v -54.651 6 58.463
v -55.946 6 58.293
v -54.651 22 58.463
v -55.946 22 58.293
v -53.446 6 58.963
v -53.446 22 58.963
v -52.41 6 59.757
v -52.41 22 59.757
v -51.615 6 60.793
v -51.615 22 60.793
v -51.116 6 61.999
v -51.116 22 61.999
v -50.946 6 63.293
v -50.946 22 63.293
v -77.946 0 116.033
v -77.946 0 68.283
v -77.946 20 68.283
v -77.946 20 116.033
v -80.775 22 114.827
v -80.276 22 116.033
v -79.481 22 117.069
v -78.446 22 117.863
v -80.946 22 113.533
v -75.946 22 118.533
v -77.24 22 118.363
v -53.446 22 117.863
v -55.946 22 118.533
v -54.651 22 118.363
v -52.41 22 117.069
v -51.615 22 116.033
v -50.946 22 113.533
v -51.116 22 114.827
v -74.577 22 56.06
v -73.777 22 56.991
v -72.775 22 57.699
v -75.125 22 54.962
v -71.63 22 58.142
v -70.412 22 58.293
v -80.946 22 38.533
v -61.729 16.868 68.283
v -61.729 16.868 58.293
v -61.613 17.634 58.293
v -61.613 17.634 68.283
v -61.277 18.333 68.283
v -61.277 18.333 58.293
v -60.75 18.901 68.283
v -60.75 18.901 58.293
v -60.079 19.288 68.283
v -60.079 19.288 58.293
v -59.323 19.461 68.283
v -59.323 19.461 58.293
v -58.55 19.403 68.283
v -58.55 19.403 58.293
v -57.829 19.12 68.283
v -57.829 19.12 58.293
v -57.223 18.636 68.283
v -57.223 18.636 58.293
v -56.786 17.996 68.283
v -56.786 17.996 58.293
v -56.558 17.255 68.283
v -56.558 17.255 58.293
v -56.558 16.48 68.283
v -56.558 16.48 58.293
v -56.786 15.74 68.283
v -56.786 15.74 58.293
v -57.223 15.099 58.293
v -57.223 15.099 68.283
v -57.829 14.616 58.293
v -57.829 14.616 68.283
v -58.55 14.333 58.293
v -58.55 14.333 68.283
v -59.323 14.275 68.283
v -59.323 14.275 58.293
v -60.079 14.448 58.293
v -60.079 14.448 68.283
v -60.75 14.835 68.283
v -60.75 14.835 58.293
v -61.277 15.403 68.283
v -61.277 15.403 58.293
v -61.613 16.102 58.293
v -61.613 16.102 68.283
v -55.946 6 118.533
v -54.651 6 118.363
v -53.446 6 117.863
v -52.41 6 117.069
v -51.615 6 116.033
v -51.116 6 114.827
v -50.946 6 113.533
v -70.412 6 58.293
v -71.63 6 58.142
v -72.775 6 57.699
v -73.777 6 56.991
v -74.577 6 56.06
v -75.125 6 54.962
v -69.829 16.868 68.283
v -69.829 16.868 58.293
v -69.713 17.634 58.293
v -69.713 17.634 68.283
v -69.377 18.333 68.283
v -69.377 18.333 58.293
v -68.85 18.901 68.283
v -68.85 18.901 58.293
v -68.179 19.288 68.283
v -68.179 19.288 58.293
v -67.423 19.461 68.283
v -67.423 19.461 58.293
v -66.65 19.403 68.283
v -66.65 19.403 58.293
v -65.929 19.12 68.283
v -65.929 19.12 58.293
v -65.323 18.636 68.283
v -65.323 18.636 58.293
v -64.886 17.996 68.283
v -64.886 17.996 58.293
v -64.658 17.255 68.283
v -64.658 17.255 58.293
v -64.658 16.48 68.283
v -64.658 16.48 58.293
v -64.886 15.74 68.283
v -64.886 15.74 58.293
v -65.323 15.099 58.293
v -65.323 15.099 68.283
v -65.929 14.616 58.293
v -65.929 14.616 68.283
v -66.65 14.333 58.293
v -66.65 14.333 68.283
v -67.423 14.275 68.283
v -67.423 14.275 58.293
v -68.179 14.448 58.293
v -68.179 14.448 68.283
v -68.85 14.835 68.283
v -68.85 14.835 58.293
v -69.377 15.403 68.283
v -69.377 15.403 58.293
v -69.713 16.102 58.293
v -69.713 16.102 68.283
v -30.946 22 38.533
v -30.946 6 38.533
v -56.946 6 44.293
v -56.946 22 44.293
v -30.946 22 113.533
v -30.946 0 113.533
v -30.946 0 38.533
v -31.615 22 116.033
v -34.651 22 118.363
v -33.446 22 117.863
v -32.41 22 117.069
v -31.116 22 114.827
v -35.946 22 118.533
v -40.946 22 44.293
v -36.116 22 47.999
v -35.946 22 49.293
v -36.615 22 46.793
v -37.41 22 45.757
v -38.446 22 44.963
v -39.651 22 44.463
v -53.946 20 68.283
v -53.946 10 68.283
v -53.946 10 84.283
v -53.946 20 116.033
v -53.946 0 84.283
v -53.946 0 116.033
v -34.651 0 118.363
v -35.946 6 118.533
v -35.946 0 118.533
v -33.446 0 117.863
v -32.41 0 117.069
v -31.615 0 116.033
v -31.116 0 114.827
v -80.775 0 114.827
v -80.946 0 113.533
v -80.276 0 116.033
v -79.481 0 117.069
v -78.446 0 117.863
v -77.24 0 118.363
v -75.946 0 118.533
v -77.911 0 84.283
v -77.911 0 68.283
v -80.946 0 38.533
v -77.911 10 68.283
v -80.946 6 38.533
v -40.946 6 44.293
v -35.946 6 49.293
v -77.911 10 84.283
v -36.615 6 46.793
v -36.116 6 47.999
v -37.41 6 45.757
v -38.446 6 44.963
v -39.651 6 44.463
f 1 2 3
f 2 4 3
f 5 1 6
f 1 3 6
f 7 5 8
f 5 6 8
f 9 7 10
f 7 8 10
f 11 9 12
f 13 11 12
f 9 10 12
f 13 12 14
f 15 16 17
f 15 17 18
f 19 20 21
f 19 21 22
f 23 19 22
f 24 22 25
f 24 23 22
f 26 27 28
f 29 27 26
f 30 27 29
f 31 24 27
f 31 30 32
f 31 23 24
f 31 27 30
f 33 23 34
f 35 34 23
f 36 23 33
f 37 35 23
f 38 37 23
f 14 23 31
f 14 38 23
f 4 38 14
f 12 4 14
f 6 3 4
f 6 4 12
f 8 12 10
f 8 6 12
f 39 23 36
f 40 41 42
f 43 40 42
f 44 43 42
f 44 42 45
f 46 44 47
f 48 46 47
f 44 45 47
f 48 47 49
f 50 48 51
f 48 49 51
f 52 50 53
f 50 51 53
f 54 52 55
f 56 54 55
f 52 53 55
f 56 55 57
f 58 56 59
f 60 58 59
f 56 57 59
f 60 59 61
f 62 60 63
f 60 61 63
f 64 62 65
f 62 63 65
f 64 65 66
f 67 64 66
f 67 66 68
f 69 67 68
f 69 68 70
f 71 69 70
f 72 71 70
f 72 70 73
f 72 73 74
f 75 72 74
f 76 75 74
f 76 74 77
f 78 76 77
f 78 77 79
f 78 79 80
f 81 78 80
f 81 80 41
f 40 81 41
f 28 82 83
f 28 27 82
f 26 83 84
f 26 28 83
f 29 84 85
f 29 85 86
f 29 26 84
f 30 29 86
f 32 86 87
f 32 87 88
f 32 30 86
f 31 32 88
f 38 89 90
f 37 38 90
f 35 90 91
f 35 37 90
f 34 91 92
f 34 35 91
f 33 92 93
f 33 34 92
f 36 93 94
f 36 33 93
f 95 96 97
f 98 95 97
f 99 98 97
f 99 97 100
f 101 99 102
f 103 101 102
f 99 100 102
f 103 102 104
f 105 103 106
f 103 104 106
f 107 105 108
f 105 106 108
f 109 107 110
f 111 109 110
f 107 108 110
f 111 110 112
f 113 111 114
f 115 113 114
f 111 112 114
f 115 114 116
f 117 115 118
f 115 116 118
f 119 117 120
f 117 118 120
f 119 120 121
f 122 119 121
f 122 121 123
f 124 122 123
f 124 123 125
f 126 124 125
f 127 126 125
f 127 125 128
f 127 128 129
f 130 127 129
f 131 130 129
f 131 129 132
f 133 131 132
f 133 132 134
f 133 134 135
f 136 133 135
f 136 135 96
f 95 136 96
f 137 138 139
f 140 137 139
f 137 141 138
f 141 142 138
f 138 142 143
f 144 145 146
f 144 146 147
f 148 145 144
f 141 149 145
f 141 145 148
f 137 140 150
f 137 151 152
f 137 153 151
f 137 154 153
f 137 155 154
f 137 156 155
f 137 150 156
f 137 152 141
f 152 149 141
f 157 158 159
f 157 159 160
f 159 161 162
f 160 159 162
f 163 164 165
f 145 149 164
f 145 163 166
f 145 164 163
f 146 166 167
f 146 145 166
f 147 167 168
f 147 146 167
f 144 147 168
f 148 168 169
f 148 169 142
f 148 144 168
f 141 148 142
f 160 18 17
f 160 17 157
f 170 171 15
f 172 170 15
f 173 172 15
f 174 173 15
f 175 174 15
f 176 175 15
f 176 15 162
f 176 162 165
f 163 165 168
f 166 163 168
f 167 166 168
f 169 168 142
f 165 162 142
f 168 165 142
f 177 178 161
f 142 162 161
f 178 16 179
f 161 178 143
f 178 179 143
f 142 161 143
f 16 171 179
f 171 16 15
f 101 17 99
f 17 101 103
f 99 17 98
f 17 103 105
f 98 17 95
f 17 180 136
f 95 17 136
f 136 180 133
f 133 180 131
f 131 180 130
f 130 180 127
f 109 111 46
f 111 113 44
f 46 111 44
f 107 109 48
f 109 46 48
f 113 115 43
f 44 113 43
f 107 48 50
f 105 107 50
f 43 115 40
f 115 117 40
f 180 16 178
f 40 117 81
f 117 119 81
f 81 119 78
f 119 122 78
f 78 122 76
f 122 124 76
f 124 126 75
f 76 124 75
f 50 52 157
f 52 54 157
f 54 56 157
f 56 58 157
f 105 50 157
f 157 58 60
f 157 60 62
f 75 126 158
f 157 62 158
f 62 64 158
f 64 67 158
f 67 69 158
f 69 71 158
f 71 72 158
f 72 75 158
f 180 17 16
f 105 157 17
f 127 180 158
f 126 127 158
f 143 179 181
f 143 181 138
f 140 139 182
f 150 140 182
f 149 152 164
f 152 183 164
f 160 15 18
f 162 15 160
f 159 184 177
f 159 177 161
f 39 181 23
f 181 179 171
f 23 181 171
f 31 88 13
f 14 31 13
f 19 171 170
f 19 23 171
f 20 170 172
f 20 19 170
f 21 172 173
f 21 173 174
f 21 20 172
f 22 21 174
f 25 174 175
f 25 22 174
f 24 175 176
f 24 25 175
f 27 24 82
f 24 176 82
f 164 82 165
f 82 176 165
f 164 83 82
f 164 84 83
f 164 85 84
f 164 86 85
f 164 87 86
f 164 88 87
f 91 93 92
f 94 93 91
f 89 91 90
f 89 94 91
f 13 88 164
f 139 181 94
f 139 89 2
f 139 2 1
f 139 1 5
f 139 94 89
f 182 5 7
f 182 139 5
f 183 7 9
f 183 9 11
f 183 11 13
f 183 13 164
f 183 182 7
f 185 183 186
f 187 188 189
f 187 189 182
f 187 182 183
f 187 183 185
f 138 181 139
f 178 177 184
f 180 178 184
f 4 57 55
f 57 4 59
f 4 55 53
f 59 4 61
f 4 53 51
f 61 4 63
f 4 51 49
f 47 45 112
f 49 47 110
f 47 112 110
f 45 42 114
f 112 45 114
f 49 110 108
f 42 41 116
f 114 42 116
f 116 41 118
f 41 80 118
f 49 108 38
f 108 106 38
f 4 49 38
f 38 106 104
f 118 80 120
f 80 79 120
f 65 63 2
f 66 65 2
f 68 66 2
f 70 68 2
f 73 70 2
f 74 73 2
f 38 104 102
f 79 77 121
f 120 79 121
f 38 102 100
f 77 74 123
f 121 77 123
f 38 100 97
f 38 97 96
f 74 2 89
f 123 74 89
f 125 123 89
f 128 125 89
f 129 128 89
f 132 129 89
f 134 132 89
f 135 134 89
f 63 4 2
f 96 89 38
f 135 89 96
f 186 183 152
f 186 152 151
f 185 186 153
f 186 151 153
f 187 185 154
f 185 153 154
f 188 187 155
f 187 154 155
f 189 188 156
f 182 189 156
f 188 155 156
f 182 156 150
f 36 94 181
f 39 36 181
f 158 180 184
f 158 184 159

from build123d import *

# Parameters (mm, degrees)
SKETCH1_W           = 50
SKETCH1_H           = 80
BOSS_EXTRUDE1_DEPTH = 6
BOSS_EXTRUDE2_DEPTH = 16
FILLET1_R           = 5
FILLET2_R           = 5
SKETCH3_R           = 2.6
CUT_EXTRUDE1_DEPTH  = 10
SKETCH4_W           = 24
SKETCH4_H           = 47.75
CUT_EXTRUDE3_DEPTH  = 20
SKETCH5_W           = 23.965270804
SKETCH5_H           = 10
BOSS_EXTRUDE3_DEPTH = 16
FILLET3_R           = 5


with BuildPart() as part:
    # Sketch1 → Boss-Extrude1 (new body)
    with BuildSketch(Plane(origin=(0, 0, 0), x_dir=(1, 0, 0), z_dir=(0, 1, 0))):
        with Locations((-55.945507312, -78.533333333)):
            Rectangle(SKETCH1_W, SKETCH1_H)
    extrude(amount=BOSS_EXTRUDE1_DEPTH)

    # Sketch2 → Boss-Extrude2 (add)
    with BuildSketch(Plane(origin=(0, 6, 0), x_dir=(1, 0, 0), z_dir=(0, 1, 0))):
        Polygon((-80.945507312, -38.533333333), (-80.945507312, -118.533333333), (-50.945507312, -118.533333333), (-50.945507312, -58.292829883), (-73.945507312, -58.292829883), align=None)
        Polygon((-35.945507312, -44.292829883), (-35.945507312, -118.533333333), (-30.945507312, -118.533333333), (-30.945507312, -38.533333333), (-56.945507312, -44.292829883), align=None)
    extrude(amount=BOSS_EXTRUDE2_DEPTH)

    # Fillet1
    fillet1_edges = [part.edges().sort_by_distance(p)[0] for p in [
        (-50.945507312, 14, 58.292829883),
        (-73.945507312, 14, 58.292829883),
    ]]
    fillet(fillet1_edges, radius=FILLET1_R)

    # Fillet2
    fillet2_edges = [part.edges().sort_by_distance(p)[0] for p in [
        (-35.945507312, 14, 44.292829883),
    ]]
    fillet(fillet2_edges, radius=FILLET2_R)

    # Sketch3 → Cut-Extrude1 (cut)
    with BuildSketch(Plane(origin=(0, 0, 58.292829883), x_dir=(-1, 0, 0), z_dir=(0, 0, -1))):
        with Locations((59.128917582, 16.867919386)):
            Circle(SKETCH3_R)
        with Locations((67.228917582, 16.867919386)):
            Circle(SKETCH3_R)
    extrude(amount=-CUT_EXTRUDE1_DEPTH, mode=Mode.SUBTRACT)

    # Sketch4 → Cut-Extrude3 (cut)
    with BuildSketch(Plane.XZ):
        with Locations((-65.945507312, 92.158333333)):
            Rectangle(SKETCH4_W, SKETCH4_H)
    extrude(amount=-CUT_EXTRUDE3_DEPTH, mode=Mode.SUBTRACT)

    # Sketch5 → Boss-Extrude3 (add)
    with BuildSketch(Plane.XY.offset(68.283333333)):
        with Locations((-65.928142714, 5)):
            Rectangle(SKETCH5_W, SKETCH5_H)
    extrude(amount=BOSS_EXTRUDE3_DEPTH)

    # Fillet3
    fillet3_edges = [part.edges().sort_by_distance(p)[0] for p in [
        (-50.945507312, 14, 118.533333333),
        (-30.945507312, 11, 118.533333333),
        (-80.945507312, 11, 118.533333333),
    ]]
    fillet(fillet3_edges, radius=FILLET3_R)


solid = part.part
